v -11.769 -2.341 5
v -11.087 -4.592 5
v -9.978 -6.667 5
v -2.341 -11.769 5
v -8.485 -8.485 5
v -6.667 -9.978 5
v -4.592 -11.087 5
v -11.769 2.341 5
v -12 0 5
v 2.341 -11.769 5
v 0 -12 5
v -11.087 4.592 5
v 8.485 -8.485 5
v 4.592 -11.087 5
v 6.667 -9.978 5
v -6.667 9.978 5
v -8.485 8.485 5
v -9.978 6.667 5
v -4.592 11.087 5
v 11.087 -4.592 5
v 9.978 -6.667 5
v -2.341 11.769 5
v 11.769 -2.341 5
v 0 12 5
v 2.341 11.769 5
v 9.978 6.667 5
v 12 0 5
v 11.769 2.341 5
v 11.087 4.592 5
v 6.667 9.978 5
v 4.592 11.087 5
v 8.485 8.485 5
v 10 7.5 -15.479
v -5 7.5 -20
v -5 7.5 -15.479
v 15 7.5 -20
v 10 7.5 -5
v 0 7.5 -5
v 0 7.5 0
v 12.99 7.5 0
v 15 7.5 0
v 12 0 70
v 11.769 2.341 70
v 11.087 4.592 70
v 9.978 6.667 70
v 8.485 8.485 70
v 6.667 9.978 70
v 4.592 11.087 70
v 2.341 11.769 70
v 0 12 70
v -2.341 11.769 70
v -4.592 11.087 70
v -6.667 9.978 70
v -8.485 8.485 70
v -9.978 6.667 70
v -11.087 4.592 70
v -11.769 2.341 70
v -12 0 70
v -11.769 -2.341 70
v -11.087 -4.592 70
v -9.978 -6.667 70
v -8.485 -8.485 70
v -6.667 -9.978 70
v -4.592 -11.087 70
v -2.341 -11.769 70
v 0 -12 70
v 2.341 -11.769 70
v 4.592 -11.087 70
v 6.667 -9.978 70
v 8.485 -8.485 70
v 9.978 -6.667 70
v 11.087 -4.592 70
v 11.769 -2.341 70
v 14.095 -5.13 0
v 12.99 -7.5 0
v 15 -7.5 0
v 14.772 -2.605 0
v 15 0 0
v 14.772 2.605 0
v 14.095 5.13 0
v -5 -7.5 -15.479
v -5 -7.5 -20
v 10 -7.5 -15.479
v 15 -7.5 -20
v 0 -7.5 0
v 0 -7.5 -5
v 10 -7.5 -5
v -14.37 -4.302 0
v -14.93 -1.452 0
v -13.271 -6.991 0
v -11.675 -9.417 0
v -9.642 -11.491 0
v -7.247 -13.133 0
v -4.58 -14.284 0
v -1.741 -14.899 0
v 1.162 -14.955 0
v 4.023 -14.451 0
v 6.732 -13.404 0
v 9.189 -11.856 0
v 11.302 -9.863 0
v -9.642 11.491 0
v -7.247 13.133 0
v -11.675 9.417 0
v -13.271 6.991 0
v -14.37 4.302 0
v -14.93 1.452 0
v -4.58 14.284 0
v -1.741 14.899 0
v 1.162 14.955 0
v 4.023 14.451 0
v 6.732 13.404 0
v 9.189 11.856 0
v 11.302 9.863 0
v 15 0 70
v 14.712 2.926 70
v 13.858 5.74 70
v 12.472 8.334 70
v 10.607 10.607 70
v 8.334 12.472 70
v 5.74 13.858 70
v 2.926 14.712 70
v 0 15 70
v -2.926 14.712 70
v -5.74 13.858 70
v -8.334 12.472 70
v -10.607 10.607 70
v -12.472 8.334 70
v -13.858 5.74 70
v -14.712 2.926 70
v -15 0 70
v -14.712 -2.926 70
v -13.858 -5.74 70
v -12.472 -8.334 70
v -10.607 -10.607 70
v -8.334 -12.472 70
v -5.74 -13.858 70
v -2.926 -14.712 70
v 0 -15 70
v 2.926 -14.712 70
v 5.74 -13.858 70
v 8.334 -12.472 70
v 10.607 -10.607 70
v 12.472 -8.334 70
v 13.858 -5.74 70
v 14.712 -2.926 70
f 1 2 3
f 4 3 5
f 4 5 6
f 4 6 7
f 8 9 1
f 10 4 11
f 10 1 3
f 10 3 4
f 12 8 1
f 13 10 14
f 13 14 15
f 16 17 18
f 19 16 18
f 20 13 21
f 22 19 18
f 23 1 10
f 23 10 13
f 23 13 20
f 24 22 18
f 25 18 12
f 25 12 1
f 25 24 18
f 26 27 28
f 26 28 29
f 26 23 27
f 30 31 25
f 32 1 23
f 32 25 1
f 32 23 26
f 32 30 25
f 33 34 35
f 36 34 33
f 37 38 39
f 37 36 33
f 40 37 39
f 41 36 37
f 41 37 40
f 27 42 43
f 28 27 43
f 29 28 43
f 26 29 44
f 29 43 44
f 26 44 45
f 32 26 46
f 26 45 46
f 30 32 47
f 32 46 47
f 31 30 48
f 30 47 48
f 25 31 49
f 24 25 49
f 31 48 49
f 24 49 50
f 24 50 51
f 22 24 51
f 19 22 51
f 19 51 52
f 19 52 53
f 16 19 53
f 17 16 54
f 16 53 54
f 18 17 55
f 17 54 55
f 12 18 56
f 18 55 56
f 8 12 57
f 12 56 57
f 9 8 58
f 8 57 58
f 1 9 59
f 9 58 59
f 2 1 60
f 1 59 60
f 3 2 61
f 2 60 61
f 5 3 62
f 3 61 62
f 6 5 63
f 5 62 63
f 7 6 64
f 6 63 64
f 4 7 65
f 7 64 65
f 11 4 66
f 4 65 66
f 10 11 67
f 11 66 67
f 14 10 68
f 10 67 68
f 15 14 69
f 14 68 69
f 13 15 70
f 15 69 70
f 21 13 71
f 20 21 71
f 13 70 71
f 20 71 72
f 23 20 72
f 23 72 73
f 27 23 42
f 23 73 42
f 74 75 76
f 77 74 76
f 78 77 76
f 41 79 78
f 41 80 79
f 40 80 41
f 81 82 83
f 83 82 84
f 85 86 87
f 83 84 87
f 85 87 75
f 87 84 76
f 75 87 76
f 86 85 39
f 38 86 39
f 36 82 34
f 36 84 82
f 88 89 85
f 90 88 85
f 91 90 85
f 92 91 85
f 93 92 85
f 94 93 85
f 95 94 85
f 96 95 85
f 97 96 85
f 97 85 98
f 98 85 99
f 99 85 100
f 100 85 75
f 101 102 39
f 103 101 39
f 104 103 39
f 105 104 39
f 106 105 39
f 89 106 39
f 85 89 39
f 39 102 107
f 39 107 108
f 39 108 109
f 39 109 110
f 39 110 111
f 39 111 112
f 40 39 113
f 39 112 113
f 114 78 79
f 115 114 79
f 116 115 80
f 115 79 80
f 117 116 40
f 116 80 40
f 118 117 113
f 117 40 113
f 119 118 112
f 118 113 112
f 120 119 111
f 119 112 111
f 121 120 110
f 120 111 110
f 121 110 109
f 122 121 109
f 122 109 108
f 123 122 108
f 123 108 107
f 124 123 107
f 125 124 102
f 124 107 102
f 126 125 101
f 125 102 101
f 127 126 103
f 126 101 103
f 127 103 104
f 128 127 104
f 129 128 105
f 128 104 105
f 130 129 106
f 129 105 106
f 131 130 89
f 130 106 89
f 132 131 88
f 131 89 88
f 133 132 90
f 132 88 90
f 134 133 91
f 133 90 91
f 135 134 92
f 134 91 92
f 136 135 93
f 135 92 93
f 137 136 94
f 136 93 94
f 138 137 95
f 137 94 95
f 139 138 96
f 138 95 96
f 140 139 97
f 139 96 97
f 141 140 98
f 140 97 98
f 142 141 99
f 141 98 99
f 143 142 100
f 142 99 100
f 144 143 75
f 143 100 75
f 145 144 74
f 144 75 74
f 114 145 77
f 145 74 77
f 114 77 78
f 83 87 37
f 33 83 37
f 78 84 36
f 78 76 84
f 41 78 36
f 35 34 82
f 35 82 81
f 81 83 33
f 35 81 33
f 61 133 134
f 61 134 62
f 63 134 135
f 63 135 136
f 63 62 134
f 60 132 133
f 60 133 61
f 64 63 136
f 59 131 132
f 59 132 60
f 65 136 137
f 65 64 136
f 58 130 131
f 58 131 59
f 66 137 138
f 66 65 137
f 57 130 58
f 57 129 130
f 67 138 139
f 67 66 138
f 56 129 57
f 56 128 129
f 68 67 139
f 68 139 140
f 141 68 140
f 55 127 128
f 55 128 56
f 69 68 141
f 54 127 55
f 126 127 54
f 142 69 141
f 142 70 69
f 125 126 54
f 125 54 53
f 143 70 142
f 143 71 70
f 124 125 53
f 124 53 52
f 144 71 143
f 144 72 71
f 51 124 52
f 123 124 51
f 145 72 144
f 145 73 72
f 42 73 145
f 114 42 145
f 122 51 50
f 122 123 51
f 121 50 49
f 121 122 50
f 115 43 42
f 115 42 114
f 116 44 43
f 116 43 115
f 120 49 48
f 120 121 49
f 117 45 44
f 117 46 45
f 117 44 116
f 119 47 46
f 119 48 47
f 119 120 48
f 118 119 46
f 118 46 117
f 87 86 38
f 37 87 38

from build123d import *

# Parameters (mm, degrees)
ESQUISSE1_R             = 15
BOSS_EXTRU_1_DEPTH      = 70
ESQUISSE2_R             = 12
ENL_V_MAT_EXTRU_1_DEPTH = 65
ESQUISSE3_W             = 5
ESQUISSE3_H             = 15
BOSS_EXTRU_2_DEPTH      = 5
ESQUISSE12_W            = 5
ESQUISSE12_H            = 15
BOSS_EXTRU_6_DEPTH      = 10
ESQUISSE13_W            = 5
ESQUISSE13_H            = 15
BOSS_EXTRU_7_DEPTH      = 15
ESQUISSE14_W            = 4.52084763
ESQUISSE14_H            = 15
BOSS_EXTRU_8_DEPTH      = 15


with BuildPart() as part:
    # Esquisse1 → Boss.-Extru.1 (new body)
    with BuildSketch(Plane.XY):
        Circle(ESQUISSE1_R)
    extrude(amount=BOSS_EXTRU_1_DEPTH)

    # Esquisse2 → Enlèv. mat.-Extru.1 (cut)
    with BuildSketch(Plane.XY.offset(70)):
        Circle(ESQUISSE2_R)
    extrude(amount=-ENL_V_MAT_EXTRU_1_DEPTH, mode=Mode.SUBTRACT)

    # Esquisse3 → Boss.-Extru.2 (add)
    with BuildSketch(Plane(origin=(0, 0, 0), x_dir=(-1, 0, 0), z_dir=(0, 0, -1))):
        with Locations((-2.5, 0)):
            Rectangle(ESQUISSE3_W, ESQUISSE3_H)
    extrude(amount=BOSS_EXTRU_2_DEPTH)

    # Esquisse12 → Boss.-Extru.6 (add)
    with BuildSketch(Plane(origin=(5, 0, 0), x_dir=(0, 0, -1), z_dir=(1, 0, 0))):
        with Locations((2.5, 0)):
            Rectangle(ESQUISSE12_W, ESQUISSE12_H)
    extrude(amount=BOSS_EXTRU_6_DEPTH)

    # Esquisse13 → Boss.-Extru.7 (add)
    with BuildSketch(Plane(origin=(0, 0, -5), x_dir=(-1, 0, 0), z_dir=(0, 0, -1))):
        with Locations((-12.5, 0)):
            Rectangle(ESQUISSE13_W, ESQUISSE13_H)
    extrude(amount=BOSS_EXTRU_7_DEPTH)

    # Esquisse14 → Boss.-Extru.8 (add)
    with BuildSketch(Plane.ZY.offset(-10)):
        with Locations((-17.739576185, 0)):
            Rectangle(ESQUISSE14_W, ESQUISSE14_H)
    extrude(amount=BOSS_EXTRU_8_DEPTH)


solid = part.part
